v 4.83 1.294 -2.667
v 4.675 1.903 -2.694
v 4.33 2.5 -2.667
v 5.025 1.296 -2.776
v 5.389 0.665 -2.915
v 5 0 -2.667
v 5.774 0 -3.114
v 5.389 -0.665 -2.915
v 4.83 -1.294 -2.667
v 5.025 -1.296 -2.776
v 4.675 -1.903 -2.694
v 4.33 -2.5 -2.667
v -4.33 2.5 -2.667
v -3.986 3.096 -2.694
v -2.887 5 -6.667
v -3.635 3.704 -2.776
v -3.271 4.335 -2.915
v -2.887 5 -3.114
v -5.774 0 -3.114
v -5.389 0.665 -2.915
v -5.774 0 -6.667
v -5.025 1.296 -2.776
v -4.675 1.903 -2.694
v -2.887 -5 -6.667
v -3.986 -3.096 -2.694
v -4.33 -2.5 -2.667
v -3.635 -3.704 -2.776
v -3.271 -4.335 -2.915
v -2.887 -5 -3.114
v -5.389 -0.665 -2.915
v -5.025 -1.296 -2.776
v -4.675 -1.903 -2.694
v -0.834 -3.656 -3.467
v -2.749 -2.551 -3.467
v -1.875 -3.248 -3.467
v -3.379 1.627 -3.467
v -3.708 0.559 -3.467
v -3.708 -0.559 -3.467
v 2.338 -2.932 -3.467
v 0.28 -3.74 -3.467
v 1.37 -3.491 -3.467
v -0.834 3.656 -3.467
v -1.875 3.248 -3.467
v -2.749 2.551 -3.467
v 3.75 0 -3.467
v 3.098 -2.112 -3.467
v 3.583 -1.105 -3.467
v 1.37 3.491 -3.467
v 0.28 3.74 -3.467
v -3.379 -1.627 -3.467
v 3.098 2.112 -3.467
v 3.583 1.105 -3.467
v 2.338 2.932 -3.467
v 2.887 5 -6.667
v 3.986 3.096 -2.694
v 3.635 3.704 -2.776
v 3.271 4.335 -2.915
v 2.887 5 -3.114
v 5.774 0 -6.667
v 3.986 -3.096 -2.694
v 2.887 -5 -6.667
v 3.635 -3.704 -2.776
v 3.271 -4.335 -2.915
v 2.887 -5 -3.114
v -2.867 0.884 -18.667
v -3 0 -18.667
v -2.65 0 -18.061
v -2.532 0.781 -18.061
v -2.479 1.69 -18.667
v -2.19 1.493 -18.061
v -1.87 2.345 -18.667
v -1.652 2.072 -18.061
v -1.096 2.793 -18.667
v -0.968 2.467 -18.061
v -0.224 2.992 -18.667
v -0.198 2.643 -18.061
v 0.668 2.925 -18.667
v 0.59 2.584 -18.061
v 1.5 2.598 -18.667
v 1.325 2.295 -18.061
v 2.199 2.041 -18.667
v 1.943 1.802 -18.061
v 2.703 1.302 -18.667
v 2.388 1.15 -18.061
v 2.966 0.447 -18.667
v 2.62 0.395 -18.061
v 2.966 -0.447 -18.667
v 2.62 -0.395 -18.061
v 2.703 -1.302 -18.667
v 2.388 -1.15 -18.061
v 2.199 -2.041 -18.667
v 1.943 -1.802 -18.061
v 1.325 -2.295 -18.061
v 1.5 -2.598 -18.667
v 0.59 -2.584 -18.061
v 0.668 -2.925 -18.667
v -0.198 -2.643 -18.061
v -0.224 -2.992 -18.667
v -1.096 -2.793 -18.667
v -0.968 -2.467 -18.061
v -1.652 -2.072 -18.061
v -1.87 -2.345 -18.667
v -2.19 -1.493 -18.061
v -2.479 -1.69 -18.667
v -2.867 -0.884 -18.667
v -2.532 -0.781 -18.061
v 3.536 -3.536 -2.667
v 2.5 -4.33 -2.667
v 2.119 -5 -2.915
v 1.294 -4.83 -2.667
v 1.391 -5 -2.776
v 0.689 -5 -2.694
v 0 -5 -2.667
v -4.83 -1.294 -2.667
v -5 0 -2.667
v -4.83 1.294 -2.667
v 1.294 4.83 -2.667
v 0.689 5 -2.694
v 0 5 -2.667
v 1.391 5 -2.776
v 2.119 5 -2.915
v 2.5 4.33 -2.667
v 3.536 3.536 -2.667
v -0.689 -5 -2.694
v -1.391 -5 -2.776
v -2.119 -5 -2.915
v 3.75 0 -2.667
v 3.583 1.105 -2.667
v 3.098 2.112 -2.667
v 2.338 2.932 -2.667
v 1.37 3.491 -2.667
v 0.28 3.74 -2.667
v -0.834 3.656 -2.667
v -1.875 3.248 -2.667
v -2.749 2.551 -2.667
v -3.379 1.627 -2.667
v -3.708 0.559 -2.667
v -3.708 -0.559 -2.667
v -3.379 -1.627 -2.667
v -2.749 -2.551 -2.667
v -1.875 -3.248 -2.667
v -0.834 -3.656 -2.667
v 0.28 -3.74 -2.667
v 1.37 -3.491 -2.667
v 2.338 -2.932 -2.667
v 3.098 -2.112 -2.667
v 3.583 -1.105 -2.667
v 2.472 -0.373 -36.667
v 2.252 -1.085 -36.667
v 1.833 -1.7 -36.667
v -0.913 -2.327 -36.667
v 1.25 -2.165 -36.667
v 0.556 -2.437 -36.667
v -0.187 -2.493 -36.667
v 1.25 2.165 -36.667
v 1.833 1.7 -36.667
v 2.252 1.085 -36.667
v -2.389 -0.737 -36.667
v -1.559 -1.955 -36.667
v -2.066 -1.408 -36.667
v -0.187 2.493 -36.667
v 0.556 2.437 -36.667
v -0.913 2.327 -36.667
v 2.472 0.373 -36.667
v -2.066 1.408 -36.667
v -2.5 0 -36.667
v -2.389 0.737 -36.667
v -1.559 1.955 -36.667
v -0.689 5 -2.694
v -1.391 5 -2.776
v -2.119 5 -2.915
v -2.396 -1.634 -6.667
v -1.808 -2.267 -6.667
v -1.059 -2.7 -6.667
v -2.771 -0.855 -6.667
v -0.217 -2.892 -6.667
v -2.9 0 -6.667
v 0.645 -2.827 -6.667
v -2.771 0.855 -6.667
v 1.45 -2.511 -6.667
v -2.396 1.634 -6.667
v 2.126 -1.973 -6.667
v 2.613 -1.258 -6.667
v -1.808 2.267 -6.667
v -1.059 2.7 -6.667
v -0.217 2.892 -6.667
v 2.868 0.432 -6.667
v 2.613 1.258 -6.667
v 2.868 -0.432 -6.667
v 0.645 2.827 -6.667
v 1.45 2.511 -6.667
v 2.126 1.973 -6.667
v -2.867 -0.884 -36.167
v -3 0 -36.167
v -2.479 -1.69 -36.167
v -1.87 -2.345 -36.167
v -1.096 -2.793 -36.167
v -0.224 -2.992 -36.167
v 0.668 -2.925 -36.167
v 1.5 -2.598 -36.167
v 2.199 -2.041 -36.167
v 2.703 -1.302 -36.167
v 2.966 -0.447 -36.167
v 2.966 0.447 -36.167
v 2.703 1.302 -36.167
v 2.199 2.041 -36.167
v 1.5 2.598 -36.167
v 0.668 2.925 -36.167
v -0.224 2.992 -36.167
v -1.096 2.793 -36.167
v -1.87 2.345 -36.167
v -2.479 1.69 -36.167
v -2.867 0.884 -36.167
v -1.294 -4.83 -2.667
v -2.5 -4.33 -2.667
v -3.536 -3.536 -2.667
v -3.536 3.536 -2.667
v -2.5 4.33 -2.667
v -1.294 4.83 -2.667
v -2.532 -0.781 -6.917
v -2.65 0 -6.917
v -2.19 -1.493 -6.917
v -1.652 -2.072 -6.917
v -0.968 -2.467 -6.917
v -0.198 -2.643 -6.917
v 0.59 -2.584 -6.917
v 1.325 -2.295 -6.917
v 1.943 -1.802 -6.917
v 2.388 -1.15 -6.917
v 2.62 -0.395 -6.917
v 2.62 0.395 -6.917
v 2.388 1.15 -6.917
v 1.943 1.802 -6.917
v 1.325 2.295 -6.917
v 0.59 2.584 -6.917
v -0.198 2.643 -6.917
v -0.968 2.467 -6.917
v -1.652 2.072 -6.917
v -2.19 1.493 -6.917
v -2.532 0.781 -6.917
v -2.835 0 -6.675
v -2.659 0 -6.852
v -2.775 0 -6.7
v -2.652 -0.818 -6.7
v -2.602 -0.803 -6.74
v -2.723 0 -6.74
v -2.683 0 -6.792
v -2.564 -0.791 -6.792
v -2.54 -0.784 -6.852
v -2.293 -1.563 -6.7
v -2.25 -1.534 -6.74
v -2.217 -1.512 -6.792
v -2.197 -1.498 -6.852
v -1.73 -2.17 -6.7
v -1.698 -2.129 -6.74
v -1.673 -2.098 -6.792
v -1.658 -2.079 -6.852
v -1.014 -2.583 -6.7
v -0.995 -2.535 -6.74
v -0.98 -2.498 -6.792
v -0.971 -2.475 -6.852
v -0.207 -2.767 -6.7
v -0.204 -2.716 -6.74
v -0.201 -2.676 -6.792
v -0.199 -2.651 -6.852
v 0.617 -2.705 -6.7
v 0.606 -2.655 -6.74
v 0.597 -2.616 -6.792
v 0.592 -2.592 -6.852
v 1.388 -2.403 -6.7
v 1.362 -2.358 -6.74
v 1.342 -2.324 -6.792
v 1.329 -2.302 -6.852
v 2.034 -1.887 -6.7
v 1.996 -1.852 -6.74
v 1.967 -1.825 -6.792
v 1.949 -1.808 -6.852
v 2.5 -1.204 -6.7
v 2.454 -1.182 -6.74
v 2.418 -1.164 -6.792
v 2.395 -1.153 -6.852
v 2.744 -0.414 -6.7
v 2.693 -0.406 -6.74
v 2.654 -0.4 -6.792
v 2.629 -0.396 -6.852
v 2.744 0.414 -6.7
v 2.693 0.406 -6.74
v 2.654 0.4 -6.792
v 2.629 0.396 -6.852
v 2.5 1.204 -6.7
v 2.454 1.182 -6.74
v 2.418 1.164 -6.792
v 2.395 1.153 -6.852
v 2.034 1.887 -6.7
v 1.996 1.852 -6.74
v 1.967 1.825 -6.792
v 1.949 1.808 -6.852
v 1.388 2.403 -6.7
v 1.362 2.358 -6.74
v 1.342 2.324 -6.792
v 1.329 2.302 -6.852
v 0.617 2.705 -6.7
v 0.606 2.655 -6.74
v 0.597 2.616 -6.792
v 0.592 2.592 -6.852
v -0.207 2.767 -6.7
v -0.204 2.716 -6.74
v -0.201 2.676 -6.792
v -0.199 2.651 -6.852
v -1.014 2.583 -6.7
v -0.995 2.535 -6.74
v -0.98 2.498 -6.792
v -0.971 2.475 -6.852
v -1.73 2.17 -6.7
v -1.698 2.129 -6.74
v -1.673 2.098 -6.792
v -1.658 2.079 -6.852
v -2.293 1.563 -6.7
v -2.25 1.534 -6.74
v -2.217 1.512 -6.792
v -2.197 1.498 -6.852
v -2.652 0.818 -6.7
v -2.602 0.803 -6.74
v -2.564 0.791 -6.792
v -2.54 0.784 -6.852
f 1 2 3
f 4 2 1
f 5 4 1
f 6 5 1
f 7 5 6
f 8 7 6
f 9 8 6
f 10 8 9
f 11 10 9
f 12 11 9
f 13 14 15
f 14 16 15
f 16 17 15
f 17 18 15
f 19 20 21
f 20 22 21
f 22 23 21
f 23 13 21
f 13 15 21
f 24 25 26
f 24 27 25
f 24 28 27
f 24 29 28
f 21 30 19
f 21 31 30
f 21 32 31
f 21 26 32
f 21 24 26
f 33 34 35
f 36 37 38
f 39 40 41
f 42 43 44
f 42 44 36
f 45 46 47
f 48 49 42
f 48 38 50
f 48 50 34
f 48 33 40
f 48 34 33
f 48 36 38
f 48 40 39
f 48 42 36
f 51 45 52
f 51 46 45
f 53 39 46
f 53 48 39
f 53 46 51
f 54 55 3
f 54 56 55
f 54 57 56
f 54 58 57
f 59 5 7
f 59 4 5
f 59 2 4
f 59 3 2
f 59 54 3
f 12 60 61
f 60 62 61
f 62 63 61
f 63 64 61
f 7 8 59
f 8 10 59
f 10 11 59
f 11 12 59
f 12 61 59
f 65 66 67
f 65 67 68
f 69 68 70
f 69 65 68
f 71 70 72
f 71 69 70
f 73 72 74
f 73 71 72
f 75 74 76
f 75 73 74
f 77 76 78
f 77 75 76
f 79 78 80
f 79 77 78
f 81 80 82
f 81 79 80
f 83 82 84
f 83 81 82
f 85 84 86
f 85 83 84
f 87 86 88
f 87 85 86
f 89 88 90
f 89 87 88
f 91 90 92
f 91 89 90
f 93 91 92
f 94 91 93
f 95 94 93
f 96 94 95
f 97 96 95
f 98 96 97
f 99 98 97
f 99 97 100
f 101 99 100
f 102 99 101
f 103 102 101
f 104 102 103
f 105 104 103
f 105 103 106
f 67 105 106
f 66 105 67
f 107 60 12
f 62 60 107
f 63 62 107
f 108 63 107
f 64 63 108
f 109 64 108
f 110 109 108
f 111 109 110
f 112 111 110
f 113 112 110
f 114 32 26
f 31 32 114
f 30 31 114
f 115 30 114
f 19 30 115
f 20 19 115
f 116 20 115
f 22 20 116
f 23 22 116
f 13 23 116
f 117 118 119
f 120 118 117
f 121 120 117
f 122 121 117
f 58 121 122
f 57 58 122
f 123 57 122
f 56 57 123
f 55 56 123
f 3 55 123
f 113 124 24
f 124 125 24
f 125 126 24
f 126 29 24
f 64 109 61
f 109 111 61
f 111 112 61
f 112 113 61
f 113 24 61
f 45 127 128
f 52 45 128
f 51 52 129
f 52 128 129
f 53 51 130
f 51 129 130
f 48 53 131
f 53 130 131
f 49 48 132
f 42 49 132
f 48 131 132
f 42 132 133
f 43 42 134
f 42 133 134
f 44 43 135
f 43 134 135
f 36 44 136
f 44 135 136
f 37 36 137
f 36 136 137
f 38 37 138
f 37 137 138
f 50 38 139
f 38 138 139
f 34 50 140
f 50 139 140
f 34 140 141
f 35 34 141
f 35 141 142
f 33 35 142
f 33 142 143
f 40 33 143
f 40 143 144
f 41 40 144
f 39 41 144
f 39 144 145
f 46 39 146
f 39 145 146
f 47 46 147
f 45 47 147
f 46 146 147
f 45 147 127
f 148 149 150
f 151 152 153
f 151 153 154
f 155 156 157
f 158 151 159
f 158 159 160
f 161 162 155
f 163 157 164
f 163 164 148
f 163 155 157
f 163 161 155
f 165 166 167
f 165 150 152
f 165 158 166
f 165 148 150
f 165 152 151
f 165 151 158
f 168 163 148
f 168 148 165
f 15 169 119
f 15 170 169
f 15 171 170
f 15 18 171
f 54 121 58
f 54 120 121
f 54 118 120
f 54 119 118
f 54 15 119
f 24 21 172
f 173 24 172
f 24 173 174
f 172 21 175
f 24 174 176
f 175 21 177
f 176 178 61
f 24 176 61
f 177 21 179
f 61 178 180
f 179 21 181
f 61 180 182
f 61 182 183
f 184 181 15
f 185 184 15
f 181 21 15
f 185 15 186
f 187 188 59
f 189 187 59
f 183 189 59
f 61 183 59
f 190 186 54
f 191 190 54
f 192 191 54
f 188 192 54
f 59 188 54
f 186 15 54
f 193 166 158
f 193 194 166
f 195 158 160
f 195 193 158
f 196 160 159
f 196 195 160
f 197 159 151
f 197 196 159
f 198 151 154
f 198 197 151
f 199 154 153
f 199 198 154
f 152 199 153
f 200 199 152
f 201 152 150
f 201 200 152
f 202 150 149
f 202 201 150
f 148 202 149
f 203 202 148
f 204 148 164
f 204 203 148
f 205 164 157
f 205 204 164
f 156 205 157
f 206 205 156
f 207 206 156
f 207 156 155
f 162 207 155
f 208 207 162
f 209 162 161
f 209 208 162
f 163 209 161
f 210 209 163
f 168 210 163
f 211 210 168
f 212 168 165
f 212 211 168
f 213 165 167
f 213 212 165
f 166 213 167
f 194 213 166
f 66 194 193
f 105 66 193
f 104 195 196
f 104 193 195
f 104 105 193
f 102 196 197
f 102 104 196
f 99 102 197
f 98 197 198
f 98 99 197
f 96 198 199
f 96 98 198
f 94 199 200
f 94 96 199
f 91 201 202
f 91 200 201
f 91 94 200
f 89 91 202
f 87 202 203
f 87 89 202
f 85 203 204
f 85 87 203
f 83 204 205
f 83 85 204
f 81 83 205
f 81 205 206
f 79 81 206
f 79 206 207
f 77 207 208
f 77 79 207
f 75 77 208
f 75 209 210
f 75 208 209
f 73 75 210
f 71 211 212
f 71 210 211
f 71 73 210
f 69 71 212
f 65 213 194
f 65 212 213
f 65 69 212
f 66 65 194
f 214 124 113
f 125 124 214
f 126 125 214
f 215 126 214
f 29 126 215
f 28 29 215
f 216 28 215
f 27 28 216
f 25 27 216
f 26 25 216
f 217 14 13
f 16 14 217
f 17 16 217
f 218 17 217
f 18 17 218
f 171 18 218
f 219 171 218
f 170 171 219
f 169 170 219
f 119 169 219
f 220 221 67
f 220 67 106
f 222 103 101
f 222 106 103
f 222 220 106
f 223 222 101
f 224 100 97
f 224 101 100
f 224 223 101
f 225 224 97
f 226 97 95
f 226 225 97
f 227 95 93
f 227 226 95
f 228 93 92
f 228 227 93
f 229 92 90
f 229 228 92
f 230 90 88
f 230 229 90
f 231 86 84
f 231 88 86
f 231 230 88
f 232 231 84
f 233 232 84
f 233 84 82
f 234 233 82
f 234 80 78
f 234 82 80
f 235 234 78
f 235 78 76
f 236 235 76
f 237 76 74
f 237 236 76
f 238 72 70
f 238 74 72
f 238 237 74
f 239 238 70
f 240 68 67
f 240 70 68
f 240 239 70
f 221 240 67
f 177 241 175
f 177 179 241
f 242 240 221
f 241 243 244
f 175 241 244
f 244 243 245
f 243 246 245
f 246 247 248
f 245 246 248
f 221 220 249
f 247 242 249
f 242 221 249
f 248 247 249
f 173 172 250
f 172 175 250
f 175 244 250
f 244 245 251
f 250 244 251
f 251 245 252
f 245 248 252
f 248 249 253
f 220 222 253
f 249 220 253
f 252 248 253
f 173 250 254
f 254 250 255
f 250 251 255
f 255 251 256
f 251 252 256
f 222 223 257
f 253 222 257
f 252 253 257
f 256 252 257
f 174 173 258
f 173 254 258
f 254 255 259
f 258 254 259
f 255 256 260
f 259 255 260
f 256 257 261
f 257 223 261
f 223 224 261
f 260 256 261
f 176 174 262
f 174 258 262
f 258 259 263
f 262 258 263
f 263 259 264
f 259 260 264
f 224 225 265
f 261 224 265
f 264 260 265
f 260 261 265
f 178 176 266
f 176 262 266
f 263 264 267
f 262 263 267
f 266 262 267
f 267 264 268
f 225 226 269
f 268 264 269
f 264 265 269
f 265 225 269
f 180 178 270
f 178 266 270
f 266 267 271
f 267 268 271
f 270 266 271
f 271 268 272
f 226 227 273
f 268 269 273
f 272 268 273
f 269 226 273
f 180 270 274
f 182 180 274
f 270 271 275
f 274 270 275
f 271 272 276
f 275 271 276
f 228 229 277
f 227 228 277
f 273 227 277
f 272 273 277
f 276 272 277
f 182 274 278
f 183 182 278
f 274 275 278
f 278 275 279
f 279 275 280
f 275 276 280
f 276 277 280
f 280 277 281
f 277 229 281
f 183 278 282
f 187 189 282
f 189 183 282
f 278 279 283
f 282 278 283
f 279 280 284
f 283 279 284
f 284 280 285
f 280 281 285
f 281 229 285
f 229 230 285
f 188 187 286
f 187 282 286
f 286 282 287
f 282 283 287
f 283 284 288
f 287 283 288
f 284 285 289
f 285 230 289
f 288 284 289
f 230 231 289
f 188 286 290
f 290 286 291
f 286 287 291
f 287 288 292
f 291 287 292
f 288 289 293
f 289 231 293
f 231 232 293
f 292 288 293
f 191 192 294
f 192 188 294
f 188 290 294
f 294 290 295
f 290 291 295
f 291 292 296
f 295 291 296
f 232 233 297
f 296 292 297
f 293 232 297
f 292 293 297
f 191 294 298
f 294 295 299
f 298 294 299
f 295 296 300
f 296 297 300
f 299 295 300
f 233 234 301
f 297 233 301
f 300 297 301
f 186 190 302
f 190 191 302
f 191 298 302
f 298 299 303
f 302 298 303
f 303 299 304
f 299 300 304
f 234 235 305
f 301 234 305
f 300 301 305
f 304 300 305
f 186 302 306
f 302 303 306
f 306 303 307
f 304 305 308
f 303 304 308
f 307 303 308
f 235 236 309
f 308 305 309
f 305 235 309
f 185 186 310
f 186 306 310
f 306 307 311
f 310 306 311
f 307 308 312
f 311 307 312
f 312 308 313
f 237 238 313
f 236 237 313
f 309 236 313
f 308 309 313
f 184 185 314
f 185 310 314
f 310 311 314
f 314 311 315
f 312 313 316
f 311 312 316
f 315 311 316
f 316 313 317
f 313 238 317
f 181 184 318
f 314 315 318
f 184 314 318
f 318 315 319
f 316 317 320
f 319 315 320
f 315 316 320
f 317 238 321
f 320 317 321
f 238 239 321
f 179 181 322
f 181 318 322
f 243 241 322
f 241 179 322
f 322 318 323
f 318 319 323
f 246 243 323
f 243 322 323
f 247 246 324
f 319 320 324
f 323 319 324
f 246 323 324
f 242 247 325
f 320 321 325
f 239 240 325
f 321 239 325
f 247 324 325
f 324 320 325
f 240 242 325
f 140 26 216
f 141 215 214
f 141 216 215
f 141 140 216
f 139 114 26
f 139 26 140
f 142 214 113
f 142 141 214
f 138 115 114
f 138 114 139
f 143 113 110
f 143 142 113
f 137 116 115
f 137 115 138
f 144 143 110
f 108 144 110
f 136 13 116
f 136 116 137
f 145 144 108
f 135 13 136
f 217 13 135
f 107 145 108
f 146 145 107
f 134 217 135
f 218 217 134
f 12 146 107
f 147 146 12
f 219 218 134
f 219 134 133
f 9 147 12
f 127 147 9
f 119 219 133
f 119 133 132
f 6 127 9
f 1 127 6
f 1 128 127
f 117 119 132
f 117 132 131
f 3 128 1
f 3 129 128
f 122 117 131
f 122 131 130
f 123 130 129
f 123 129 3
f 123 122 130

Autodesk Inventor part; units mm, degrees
ref_plane "YZ Plane" through (0, 0, 0) normal (1, 0, 0) x (0, 1, 0)
sketch "Sketch2" plane through (0, 0, 0) normal (0, 1, 0) x (-1, 0, 0)
  line L0 (0, -6.6669) -> (0, -36.6669)
  line L1 (0, -36.6669) -> (2.5, -36.6669)
  line L2 (3, -36.1669) -> (3, -18.6669)
  line L3 (3, -18.6669) -> (2.65, -18.0607)
  line L4 (2.65, -18.0607) -> (2.65, -6.6669)
  line L5 (2.65, -6.6669) -> (0, -6.6669)
  line L6 (2.5, -36.6669) -> (3, -36.1669)
  line L7 (3, -36.6669) -> (3, -37.374)
  line L8 (0, -43.5155) -> (0, -0.5255) projected
  dimension "Ds" = 5.3
  dimension "NND" = 6
  dimension "b" = 18
  dimension "d3" = 30
  dimension "d5" = 45
  dimension "PTC" = 1
  dimension "NLG" = 30
revolve "Revolution1" add sketch "Sketch2" angle 360 about axis through (0, 0, -6.6669) along (0, 0, -1)
sketch "Sketch3" plane through (0, 0, -6.6669) normal (0, 0, 1) x (1, 0, 0)
  circle A0 centre (0, 0) radius 2.65 projected
  line L0 (0, 5) -> (2.8868, 5)
  line L1 (2.8868, 5) -> (5.7735, 0)
  line L2 (5.7735, 0) -> (0, 0)
  line L3 (0, 0) -> (0, 5)
  line L4 (0, 5) -> (-2.8868, 5)
  line L5 (-2.8868, 5) -> (-5.7735, 0)
  line L6 (0, -5) -> (2.8868, -5)
  line L7 (2.8868, -5) -> (5.7735, 0)
  line L8 (-2.8868, -5) -> (-5.7735, 0)
  line L9 (0, -5) -> (-2.8868, -5)
  dimension "d9" = 60
  dimension "ParS" = 10
  dimension "msp_d11" = 10
extrude "Extrusion1" add sketch "Sketch3" along normal blind 4
sketch "Sketch4" plane through (0, 0, 0) normal (0, 1, 0) x (-1, 0, 0)
  line L0 (-5, -2.6669) -> (-5.7735, -2.6669)
  line L1 (-5.7735, -2.6669) -> (-5.7735, -3.1135)
  line L2 (-5.7735, -3.1135) -> (-5, -2.6669)
  line L3 (0, -13.5254) -> (0, 34.4838) projected
  line L4 (0, 27.6253) -> (0, 27.1787)
  line L5 (-5.7735, -6.6669) -> (-5.7735, -2.6669) projected
  line L6 (-2.8868, -2.6669) -> (-5.7735, -2.6669) projected
  dimension "d14" = 30
  dimension "msp_d15" = 10
revolve "Revolution2" cut sketch "Sketch4" angle 360 about axis through (0, 0, 27.6253) along (0, 0, -1)
sketch "Sketch5" plane through (0, 0, -2.6669) normal (0, 0, 1) x (1, 0, 0)
  arc A0 (4.3301, 2.5) -> (0, 5) centre (0, 0) ccw projected
  circle A1 centre (0, 0) radius 3.75
  dimension "d27" = 7.5
extrude "Extrusion2" cut sketch "Sketch5" against normal blind 0.8
thread "Thread1" size "M6x1" class "6g" standard "ISO Metric profile" full length
ref_plane "MSC_PF1" through (0, 0, 0) normal (0, 1, 0) x (-1, 0, 0)
ref_plane "MSC_PT1" through (0, 0, -6.6669) normal (0, 0, -1) x (-1, 0, 0)
fillet "Fillet1" radius 0.25 1 edges at (2.65, 0, -6.6669)
equation "\"msp_d11\" = ParS"
equation "\"msp_d15\" = ParS"
equation "\"d27\" = 0.75 * ParS"
equation "\"d28\" = 0.2 * ParK"
equation "\"d30\" = r"
equation "\"msp_d17\" = b"
equation "\"r\" = 0.25"
equation "\"THREADDIA\" = NND"
equation "\"ParK\" = 4"
properties part number "ISO 4015 - M6 x 30" material "Stainless Steel, 440C"
